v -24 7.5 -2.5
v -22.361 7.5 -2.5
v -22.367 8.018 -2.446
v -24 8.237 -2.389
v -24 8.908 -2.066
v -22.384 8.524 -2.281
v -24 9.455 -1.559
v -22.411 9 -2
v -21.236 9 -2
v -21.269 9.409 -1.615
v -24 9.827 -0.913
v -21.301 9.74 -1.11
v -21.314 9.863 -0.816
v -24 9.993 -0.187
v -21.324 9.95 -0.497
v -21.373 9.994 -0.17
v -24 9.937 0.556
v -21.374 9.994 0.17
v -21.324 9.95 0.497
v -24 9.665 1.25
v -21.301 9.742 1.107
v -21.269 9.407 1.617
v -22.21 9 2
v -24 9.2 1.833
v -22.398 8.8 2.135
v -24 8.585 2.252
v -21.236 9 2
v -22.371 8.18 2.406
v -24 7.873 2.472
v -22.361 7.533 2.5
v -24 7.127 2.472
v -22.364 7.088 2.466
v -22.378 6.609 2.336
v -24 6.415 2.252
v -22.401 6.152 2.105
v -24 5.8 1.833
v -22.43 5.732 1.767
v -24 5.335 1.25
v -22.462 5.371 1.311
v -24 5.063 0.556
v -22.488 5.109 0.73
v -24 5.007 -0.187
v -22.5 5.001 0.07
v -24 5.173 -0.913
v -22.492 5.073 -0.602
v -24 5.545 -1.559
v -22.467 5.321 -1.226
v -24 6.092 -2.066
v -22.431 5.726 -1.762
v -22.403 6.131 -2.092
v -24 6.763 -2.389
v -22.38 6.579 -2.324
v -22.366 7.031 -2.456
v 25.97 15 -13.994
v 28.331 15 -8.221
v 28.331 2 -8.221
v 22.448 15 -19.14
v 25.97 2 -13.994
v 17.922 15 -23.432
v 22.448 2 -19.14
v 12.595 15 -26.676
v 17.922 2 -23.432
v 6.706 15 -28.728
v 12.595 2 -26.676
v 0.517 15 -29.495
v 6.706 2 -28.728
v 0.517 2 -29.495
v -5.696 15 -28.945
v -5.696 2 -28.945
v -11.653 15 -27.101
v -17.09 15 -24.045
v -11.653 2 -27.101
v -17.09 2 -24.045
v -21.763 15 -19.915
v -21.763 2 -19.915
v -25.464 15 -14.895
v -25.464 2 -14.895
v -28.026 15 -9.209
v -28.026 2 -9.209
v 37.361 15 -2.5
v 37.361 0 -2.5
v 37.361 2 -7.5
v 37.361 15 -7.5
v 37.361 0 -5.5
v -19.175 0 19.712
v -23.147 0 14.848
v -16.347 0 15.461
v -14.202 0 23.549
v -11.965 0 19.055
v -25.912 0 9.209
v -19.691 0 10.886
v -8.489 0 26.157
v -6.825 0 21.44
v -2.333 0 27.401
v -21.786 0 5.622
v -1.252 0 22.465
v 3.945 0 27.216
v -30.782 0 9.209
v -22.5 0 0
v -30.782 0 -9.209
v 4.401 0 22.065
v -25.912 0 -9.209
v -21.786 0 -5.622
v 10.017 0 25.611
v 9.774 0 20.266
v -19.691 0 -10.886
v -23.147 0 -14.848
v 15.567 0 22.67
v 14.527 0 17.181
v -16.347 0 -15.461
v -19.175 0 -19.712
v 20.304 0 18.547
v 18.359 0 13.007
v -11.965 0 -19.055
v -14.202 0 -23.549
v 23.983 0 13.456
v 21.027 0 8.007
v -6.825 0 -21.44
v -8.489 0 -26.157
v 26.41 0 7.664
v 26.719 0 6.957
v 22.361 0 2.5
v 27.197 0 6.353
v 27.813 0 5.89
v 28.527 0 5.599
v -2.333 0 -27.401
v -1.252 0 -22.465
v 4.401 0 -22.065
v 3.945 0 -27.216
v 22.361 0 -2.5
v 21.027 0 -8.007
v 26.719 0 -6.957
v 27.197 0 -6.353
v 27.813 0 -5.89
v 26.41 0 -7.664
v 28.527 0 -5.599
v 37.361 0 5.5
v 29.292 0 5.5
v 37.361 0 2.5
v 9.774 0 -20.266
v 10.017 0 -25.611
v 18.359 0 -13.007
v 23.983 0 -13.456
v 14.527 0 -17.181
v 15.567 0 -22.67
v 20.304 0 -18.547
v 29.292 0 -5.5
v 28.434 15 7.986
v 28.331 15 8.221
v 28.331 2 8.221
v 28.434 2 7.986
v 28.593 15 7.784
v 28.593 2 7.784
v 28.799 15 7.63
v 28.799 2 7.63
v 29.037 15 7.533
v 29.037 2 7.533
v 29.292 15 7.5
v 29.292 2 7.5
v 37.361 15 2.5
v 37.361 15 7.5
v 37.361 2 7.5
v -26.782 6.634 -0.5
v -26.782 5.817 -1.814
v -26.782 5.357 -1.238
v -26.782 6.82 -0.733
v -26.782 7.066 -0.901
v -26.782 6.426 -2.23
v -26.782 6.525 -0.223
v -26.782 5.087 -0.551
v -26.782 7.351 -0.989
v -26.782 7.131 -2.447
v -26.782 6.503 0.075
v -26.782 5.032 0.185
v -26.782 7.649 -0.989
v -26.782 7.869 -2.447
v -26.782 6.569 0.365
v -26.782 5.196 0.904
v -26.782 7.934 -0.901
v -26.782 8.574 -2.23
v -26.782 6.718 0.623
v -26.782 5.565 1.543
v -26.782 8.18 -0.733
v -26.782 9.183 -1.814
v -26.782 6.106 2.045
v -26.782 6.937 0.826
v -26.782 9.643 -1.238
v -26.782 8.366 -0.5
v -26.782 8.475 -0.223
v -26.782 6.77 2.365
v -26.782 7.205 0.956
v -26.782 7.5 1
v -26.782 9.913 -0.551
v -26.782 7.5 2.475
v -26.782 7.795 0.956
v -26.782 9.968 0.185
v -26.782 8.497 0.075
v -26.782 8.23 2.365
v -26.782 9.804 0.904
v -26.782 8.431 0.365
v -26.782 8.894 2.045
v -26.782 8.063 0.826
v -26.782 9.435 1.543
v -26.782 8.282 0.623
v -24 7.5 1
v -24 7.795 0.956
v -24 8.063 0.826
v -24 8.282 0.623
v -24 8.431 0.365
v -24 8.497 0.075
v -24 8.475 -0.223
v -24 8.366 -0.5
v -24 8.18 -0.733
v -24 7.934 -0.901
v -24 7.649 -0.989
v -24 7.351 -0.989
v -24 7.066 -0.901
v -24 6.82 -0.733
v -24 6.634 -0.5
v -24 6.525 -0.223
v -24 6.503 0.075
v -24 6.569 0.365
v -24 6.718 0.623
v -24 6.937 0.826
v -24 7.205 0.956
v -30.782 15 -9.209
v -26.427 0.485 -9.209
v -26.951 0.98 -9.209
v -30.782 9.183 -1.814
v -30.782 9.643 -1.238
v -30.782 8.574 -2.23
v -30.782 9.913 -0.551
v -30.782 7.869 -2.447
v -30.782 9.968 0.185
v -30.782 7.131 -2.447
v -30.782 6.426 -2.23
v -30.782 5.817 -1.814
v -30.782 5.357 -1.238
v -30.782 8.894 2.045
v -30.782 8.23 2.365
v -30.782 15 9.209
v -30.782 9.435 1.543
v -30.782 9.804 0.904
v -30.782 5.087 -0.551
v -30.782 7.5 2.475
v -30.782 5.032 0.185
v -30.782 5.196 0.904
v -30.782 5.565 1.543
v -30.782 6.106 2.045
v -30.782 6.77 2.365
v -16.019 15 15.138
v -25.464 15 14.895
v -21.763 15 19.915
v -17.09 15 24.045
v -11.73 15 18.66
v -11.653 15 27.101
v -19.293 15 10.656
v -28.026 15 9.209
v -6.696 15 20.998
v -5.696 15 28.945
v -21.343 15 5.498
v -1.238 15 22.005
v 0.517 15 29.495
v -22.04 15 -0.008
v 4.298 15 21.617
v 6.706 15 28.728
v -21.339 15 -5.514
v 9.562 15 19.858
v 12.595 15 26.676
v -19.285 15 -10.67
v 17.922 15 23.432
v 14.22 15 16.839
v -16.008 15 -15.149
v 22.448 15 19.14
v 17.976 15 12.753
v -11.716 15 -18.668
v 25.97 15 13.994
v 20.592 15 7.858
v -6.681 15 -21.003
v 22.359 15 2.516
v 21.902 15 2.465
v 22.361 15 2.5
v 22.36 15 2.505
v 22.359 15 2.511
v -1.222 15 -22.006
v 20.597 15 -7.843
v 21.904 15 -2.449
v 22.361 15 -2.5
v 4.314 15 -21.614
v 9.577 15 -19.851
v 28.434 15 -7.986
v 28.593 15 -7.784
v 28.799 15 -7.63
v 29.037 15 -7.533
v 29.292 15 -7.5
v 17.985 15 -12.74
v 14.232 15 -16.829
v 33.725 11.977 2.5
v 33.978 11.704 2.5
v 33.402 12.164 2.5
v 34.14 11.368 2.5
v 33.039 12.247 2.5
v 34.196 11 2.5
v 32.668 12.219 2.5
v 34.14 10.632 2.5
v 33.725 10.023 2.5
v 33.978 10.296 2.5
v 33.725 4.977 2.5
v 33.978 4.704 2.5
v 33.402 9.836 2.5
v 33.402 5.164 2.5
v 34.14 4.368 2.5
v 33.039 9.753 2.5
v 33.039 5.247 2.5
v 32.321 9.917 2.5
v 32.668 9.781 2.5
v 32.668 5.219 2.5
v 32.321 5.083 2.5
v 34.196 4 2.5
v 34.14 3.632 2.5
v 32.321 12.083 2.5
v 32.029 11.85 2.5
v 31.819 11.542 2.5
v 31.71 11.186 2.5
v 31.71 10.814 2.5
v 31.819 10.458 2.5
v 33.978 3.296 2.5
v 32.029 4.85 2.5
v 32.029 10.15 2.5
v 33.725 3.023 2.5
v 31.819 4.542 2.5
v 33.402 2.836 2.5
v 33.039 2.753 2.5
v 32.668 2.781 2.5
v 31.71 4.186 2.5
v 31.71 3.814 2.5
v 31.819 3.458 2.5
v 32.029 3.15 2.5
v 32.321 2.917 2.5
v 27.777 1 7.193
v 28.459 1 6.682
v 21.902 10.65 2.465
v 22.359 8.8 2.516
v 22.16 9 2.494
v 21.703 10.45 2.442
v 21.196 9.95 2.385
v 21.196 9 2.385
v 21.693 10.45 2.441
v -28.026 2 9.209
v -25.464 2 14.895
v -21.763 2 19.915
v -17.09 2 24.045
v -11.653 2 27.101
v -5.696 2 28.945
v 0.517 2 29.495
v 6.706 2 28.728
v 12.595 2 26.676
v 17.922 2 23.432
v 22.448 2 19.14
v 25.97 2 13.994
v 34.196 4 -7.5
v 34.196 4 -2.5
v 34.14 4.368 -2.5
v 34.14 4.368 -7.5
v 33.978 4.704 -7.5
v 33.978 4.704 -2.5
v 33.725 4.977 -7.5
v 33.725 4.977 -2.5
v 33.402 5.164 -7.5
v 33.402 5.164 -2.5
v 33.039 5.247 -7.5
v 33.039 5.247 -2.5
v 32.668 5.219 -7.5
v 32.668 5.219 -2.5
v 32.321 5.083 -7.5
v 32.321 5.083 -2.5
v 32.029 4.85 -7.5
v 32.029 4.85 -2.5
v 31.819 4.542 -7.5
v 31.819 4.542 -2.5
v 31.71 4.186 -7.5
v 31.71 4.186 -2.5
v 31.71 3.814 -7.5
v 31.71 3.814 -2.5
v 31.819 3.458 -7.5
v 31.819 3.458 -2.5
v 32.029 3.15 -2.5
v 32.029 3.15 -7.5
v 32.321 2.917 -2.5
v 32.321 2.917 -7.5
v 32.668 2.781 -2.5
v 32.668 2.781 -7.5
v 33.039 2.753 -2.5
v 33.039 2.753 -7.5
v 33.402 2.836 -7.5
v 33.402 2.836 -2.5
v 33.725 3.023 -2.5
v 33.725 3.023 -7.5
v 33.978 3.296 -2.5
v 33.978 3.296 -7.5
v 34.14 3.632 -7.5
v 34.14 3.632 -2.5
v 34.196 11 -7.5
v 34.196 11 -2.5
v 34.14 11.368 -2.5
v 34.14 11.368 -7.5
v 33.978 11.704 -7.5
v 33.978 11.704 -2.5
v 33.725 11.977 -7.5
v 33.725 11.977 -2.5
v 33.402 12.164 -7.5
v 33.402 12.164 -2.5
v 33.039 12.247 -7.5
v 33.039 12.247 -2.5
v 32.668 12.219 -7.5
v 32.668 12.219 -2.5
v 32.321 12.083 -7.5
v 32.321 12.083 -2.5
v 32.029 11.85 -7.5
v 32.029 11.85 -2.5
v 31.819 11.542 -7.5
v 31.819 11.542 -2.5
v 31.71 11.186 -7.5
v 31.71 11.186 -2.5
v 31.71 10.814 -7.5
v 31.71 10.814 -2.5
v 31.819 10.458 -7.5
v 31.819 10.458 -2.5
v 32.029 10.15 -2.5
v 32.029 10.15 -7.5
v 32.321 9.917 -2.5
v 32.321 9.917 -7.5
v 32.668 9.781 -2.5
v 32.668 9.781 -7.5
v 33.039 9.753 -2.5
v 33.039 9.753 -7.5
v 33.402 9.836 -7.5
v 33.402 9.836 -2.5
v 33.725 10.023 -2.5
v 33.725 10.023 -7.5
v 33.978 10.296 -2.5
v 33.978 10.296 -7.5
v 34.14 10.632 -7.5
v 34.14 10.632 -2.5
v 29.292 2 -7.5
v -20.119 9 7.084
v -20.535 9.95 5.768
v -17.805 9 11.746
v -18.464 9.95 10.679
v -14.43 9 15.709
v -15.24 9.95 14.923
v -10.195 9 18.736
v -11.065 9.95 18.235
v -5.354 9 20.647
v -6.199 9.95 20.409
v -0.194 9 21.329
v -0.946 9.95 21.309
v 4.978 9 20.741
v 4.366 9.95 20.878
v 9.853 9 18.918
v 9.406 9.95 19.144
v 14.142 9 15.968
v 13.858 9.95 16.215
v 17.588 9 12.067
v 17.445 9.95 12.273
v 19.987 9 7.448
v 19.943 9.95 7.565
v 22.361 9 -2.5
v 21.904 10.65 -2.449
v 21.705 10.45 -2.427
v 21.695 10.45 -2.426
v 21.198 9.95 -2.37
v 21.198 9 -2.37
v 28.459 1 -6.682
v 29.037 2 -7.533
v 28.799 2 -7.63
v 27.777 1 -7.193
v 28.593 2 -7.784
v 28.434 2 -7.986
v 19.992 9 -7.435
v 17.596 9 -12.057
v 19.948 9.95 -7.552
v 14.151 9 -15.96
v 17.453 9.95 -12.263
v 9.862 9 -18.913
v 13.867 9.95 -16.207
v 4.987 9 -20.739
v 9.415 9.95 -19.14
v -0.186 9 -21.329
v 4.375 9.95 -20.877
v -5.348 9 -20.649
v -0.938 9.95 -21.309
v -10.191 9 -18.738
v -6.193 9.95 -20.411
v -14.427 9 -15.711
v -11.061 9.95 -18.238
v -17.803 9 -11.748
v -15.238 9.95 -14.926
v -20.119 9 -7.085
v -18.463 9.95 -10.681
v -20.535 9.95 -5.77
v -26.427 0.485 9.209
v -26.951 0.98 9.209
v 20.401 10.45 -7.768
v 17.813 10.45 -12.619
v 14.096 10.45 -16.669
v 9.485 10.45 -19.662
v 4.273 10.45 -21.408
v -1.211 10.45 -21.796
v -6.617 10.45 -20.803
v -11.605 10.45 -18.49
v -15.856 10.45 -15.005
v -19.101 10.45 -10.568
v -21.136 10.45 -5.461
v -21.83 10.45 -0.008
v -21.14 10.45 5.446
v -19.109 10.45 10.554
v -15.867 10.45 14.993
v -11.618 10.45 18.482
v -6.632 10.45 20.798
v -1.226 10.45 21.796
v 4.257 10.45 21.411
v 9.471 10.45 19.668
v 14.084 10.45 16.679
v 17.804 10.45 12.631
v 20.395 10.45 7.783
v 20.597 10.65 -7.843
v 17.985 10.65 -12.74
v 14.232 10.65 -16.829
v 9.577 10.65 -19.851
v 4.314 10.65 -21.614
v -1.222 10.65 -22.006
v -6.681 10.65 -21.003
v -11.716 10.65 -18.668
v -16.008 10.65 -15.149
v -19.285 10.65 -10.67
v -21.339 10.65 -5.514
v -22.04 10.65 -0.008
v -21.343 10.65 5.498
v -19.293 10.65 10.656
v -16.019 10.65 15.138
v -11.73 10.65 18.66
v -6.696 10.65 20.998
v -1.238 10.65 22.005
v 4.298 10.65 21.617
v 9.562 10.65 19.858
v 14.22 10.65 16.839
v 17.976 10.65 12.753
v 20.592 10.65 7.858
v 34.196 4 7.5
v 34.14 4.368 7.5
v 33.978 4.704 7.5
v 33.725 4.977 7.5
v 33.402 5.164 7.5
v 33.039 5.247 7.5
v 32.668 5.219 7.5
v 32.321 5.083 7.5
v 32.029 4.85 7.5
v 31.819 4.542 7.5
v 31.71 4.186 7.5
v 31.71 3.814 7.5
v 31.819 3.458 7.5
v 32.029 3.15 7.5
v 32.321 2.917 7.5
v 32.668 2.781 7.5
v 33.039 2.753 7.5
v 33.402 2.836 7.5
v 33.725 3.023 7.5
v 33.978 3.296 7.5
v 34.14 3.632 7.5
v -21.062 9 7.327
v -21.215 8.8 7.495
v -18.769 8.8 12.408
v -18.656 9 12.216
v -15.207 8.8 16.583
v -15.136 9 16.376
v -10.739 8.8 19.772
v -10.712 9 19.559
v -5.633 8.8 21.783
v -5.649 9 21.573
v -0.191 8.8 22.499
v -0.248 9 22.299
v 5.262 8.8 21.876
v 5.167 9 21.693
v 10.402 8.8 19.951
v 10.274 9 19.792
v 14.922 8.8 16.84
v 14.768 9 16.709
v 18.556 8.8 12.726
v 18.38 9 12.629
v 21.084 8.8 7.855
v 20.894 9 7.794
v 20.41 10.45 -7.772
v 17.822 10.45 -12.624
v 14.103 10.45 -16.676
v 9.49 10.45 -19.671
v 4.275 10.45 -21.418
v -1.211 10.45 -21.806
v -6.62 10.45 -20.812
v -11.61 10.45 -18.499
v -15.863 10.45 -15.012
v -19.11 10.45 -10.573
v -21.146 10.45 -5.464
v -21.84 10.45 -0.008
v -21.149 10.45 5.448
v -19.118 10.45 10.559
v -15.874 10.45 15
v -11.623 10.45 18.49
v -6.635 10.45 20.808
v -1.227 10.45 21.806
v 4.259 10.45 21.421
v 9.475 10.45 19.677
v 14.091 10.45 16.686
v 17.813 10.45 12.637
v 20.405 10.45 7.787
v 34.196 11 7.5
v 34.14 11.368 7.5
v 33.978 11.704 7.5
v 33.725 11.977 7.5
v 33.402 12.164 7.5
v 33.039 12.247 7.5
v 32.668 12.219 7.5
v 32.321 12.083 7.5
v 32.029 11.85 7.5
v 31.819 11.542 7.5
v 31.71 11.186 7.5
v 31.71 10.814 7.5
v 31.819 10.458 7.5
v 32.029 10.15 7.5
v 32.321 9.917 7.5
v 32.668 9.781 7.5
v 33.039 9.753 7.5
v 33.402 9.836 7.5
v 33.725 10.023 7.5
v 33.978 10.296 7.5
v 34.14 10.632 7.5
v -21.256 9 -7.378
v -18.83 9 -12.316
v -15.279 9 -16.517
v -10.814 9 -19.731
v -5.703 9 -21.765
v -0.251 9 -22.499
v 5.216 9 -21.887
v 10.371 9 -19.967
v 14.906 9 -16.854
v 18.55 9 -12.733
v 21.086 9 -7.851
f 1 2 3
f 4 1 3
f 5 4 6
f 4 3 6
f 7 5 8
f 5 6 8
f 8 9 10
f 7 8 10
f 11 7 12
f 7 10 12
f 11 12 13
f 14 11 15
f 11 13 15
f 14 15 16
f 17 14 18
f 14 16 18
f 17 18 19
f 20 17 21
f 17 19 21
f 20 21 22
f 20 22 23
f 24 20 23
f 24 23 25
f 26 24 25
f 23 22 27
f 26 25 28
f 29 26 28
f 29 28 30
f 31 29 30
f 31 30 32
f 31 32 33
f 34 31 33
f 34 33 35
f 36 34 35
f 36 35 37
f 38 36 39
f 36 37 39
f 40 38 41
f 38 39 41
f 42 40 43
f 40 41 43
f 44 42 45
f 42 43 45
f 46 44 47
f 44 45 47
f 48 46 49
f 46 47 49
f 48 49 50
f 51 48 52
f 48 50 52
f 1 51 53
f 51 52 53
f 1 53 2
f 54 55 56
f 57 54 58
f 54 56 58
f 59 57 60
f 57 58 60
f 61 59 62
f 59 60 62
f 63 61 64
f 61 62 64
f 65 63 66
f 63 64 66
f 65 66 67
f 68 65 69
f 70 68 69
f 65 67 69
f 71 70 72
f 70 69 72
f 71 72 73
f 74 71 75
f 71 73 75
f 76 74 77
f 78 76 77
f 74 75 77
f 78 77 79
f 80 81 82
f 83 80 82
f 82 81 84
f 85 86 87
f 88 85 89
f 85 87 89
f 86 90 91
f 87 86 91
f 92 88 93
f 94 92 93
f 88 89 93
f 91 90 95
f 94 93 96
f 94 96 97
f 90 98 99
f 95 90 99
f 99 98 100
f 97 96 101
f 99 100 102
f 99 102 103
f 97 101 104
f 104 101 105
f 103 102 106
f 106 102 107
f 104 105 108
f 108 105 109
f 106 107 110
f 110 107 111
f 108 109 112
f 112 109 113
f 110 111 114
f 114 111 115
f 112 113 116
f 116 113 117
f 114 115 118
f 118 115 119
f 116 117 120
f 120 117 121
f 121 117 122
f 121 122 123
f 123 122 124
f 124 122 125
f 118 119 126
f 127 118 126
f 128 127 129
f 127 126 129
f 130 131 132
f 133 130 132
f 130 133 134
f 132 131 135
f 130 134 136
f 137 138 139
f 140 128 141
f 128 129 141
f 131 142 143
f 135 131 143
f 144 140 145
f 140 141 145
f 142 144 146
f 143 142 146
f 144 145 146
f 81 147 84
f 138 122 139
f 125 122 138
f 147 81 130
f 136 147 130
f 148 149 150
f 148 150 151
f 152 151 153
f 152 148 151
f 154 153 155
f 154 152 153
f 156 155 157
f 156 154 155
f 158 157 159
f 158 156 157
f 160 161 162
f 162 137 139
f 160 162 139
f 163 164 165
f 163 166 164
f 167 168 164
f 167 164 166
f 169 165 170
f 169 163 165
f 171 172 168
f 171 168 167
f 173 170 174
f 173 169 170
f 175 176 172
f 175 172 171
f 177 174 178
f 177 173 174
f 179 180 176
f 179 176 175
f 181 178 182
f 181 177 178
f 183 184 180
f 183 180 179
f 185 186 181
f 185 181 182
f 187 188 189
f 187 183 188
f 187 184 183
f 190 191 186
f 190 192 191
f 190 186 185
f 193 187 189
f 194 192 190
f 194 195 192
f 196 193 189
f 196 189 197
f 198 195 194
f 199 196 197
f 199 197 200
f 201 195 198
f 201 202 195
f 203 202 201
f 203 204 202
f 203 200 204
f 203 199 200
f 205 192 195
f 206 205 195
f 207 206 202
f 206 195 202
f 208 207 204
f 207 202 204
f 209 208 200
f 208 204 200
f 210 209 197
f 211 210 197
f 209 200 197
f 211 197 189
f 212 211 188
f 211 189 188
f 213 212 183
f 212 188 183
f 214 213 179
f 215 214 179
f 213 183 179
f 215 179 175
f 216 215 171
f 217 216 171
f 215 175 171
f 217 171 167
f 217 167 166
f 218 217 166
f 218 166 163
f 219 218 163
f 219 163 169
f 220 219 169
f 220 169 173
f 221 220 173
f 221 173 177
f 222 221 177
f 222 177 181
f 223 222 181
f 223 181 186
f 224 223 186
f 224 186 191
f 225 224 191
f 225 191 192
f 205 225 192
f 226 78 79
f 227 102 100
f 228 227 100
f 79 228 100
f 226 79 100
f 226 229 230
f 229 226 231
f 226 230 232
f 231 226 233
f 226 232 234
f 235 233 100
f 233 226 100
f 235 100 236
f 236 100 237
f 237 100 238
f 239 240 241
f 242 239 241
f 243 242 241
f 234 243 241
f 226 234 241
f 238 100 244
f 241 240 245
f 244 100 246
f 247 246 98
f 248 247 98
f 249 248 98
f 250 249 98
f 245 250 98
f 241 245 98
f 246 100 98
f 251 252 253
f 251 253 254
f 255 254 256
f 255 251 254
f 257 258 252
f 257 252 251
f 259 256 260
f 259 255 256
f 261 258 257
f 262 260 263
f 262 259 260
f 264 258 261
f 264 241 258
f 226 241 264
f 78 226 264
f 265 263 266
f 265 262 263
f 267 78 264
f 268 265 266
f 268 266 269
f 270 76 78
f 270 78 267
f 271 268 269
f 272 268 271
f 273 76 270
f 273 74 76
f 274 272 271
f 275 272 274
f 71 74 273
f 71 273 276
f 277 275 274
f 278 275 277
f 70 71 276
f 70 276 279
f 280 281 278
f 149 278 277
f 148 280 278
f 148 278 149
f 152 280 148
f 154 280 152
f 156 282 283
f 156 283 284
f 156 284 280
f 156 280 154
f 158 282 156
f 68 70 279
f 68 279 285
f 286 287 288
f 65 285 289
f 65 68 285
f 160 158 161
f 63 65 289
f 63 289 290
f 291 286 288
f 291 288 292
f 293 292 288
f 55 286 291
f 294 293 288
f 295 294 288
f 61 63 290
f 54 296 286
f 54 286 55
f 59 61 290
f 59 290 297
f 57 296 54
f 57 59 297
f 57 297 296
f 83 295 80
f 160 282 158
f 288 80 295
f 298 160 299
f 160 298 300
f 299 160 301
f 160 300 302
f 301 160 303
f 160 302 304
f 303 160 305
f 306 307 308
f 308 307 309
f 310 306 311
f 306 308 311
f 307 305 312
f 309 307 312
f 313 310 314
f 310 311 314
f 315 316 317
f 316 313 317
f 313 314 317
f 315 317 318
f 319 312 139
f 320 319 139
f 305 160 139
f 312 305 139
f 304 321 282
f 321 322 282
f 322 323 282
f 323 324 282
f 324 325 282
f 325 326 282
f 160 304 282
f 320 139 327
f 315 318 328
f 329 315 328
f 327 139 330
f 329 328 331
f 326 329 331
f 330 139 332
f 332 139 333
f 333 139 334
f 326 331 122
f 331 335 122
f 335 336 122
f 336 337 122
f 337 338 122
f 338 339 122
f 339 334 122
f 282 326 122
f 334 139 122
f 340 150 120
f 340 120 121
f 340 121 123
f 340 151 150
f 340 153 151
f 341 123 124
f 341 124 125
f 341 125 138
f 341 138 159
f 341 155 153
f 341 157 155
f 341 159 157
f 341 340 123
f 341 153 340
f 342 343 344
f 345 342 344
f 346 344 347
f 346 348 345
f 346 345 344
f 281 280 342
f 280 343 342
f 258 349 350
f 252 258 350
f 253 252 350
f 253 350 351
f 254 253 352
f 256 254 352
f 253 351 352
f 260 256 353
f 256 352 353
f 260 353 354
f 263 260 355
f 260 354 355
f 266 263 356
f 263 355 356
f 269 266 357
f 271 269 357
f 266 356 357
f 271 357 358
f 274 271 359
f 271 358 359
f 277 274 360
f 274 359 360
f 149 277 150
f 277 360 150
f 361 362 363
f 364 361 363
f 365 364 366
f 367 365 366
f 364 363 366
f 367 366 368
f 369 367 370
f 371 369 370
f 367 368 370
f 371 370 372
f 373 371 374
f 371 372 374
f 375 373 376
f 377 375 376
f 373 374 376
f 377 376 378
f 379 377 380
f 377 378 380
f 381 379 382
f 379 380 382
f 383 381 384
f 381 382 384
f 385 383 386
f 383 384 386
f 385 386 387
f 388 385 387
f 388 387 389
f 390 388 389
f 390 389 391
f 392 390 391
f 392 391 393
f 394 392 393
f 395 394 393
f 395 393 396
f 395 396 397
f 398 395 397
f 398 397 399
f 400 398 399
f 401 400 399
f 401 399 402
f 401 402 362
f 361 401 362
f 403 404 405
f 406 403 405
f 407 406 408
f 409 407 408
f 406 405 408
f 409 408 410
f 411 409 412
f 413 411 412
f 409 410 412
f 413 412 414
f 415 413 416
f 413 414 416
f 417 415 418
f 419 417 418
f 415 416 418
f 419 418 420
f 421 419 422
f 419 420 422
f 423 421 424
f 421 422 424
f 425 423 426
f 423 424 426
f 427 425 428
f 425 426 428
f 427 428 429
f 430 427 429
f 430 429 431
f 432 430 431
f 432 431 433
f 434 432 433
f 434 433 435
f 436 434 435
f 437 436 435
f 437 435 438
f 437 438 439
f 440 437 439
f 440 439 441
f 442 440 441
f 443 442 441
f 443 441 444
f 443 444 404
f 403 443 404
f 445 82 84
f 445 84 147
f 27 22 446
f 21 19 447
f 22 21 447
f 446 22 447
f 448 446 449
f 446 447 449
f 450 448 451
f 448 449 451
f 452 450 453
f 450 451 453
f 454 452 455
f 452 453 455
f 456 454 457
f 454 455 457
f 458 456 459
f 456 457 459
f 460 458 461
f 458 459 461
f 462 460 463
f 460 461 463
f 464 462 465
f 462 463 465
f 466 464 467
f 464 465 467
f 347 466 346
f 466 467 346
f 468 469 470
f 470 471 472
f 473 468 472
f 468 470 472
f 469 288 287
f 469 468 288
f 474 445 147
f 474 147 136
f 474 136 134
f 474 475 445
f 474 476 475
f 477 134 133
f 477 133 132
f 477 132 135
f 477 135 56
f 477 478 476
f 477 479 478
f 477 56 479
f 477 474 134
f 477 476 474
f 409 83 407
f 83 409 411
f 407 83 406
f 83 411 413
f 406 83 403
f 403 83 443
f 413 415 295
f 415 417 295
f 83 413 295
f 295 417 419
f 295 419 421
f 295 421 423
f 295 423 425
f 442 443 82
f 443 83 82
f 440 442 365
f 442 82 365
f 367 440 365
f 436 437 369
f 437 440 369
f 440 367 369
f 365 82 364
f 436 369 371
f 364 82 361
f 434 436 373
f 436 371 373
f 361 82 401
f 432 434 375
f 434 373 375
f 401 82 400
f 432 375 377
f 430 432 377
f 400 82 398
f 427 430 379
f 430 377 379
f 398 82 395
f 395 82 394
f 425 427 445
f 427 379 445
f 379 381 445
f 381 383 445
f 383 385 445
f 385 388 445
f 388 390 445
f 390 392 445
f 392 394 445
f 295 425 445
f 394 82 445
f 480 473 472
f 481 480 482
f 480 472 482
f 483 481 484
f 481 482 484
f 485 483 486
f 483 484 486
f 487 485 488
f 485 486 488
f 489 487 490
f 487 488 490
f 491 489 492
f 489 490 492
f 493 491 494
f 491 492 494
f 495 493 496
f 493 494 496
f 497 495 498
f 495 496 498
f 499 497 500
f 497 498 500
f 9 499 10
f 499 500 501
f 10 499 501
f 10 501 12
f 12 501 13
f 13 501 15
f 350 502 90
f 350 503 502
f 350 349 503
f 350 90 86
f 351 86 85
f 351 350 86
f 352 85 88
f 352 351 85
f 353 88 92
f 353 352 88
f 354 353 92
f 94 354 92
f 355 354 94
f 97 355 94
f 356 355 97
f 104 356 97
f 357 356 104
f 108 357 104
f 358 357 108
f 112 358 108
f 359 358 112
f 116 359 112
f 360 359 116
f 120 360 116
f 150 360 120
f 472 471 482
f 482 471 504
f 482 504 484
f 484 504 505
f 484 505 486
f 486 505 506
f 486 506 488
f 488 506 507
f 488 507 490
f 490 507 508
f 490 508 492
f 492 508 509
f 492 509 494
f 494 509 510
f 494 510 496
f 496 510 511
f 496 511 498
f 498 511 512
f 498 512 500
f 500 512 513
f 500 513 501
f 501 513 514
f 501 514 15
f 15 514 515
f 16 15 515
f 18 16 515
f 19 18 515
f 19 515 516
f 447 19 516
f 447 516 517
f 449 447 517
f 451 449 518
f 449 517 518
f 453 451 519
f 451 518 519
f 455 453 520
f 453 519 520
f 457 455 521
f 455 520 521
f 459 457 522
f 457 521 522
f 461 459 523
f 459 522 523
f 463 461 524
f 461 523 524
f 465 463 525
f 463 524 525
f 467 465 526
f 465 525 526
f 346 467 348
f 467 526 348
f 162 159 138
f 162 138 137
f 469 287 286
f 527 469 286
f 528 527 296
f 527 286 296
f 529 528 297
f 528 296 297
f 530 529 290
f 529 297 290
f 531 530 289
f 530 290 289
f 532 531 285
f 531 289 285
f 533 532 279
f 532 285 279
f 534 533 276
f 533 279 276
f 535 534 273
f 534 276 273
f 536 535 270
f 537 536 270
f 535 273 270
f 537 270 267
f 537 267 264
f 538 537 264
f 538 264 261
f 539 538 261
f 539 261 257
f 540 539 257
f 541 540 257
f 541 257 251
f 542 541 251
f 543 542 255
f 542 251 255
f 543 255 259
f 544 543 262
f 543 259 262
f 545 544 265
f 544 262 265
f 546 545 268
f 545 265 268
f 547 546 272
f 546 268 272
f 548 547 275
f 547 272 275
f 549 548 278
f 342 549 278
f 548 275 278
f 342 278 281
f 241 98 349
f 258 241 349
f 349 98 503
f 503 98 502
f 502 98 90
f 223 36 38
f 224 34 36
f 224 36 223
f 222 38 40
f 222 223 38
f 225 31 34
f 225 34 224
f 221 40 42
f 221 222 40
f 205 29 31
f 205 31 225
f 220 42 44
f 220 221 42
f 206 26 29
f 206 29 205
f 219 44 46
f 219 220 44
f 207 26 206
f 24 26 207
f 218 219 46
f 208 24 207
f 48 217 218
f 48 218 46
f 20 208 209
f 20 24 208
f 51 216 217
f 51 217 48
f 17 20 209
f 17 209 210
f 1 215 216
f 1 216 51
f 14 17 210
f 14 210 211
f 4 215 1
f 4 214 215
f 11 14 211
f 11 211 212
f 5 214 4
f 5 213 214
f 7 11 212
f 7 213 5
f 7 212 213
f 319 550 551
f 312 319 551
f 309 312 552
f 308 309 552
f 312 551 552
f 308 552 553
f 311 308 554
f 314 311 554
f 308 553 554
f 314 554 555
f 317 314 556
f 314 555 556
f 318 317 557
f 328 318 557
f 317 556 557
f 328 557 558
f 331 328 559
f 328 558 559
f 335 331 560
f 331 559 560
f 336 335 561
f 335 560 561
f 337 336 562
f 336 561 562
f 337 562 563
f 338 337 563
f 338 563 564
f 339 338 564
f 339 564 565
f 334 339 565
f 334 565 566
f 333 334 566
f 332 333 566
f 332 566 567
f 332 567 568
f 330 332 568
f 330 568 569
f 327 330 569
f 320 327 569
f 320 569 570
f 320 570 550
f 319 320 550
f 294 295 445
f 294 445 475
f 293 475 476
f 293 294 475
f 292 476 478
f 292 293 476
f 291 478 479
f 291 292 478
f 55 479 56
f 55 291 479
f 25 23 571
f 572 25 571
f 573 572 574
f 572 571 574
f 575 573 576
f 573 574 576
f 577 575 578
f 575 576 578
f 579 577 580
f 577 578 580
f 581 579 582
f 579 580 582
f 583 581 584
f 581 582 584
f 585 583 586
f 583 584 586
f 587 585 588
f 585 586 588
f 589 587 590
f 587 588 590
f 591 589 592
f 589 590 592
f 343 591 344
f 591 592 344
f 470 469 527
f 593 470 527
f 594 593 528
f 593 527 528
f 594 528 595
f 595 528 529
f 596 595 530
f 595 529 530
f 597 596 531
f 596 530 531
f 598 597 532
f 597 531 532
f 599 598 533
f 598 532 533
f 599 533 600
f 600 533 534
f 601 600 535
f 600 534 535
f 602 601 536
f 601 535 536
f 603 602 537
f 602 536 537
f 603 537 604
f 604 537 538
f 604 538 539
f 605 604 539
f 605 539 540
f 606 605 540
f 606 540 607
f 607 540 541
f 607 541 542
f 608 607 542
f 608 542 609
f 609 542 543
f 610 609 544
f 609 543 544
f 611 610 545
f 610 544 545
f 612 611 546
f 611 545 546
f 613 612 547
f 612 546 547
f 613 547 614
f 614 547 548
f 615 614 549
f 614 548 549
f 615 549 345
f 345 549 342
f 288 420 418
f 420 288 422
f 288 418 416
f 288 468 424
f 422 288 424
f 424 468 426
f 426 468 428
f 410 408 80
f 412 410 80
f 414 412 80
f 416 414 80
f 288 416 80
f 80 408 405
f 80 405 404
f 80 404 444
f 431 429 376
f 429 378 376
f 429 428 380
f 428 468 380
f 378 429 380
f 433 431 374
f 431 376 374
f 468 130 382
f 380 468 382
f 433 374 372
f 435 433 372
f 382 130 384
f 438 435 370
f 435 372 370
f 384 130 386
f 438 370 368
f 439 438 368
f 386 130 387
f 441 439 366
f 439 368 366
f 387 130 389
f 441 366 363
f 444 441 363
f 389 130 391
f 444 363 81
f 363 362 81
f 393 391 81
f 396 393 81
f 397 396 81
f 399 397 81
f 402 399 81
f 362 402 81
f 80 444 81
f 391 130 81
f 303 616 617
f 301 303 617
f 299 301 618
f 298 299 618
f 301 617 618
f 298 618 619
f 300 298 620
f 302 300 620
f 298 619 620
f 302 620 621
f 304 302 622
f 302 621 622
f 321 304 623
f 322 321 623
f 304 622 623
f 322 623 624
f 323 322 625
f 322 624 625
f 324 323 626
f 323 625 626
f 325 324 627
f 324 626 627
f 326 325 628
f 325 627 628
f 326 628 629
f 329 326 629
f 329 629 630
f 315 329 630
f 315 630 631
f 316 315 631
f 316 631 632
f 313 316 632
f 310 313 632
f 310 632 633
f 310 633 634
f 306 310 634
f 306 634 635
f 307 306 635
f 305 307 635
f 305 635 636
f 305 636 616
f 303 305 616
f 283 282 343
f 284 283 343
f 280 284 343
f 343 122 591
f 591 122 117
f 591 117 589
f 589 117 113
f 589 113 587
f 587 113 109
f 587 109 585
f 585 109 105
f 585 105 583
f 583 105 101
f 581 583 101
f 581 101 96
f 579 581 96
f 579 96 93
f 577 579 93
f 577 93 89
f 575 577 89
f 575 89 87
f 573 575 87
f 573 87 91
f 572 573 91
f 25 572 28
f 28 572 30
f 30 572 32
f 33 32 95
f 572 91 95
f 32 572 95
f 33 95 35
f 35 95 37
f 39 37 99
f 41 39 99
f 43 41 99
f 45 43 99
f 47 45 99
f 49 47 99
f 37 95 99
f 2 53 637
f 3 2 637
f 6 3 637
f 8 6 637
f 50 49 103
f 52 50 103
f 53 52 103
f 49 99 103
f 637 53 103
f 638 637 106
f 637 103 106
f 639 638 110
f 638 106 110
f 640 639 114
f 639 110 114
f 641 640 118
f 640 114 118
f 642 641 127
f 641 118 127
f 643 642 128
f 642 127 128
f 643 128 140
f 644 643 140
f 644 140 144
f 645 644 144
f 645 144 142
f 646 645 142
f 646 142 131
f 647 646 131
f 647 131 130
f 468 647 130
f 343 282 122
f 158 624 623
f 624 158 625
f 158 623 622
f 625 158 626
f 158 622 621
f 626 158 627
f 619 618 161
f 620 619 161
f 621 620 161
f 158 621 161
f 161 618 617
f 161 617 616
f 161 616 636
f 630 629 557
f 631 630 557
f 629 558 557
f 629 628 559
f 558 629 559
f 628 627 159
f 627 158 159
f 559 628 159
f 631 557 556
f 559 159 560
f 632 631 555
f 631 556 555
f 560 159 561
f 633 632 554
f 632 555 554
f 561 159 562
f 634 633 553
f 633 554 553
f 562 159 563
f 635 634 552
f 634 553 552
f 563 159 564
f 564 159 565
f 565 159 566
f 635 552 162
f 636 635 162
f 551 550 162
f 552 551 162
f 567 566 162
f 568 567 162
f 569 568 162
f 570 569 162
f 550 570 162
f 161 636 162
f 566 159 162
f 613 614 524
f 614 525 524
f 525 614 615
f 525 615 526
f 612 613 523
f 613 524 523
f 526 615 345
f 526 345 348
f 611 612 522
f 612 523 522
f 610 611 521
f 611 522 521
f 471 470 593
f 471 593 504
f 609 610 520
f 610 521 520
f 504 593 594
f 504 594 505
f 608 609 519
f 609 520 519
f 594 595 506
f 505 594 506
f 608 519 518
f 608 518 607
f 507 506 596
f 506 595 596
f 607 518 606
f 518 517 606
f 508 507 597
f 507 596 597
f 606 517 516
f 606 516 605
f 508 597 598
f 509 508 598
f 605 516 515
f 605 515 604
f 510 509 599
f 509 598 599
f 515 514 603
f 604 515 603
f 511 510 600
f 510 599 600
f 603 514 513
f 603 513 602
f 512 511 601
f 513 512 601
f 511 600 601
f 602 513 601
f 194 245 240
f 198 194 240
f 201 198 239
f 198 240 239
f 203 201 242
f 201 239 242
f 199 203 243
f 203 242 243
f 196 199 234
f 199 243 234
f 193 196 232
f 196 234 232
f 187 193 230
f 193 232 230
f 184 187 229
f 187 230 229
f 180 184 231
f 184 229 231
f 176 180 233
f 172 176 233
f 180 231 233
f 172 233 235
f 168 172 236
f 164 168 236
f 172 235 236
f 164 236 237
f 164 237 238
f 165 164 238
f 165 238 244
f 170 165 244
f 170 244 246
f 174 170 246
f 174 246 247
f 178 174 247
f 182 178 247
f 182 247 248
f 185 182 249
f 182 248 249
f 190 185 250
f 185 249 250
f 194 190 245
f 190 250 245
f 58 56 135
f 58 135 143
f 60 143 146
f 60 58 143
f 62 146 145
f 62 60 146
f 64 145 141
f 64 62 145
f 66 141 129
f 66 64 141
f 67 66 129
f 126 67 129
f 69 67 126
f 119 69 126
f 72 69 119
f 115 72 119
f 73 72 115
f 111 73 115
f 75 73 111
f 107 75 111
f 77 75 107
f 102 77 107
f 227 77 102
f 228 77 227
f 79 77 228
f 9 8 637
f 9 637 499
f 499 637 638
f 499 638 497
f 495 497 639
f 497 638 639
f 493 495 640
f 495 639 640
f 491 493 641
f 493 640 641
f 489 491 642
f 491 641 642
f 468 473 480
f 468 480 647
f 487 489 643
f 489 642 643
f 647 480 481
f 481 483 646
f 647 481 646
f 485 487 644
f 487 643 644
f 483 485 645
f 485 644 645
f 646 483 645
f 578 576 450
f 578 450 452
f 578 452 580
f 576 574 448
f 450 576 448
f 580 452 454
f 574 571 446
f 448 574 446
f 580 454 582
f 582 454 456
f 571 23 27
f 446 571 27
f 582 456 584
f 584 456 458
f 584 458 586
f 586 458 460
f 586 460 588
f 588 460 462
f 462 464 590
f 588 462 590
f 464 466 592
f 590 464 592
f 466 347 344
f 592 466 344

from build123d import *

# Parameters (mm, degrees)
BOSS_EXTRUDE1_DEPTH = 15
REVOLVE2_ANGLE      = 347.2
SKETCH9_R           = 1.25
CUT_EXTRUDE1_DEPTH  = 20
SKETCH10_R          = 2.475
CUT_EXTRUDE3_DEPTH  = 4
SKETCH12_R          = 1
CUT_EXTRUDE4_DEPTH  = 5
SKETCH13_R          = 2.5
CUT_EXTRUDE6_DEPTH  = 24
CHAMFER1_SIZE       = 0.2
FILLET1_R           = 1
CHAMFER2_SIZE       = 0.5
CHAMFER3_SIZE       = 2


with BuildPart() as part:
    # Sketch3 → Boss-Extrude1 (new body)
    with BuildSketch(Plane(origin=(0, 0, 0), x_dir=(1, 0, 0), z_dir=(0, 1, 0))):
        with BuildLine():
            Line((22.360679775, 2.5), (37.360679775, 2.5))
            Line((37.360679775, 2.5), (37.360679775, 7.5))
            Line((37.360679775, 7.5), (28.530685235, 7.5))
            ThreePointArc((28.530685235, 7.5), (0.890802954, 29.486547273), (-28.025910222, 9.208602294))
            Line((-28.025910222, 9.208602294), (-30.781929629, 9.208602294))
            Line((-30.781929629, 9.208602294), (-30.781929629, -9.208602294))
            Line((-30.781929629, -9.208602294), (-28.025910222, -9.208602294))
            ThreePointArc((-28.025910222, -9.208602294), (0.890802954, -29.486547273), (28.530685235, -7.5))
            Line((28.530685235, -7.5), (37.360679775, -7.5))
            Line((37.360679775, -7.5), (37.360679775, -2.5))
            Line((37.360679775, -2.5), (22.360679775, -2.5))
            ThreePointArc((22.360679775, -2.5), (-22.5, 0), (22.360679775, 2.5))
        make_face()
    extrude(amount=BOSS_EXTRUDE1_DEPTH)

    # Sketch8 → Revolve2 (revolve)
    with BuildSketch(Plane(origin=(0, 0, 0), x_dir=(-0.9938079899999066, 0, 0.11111111111111108), z_dir=(-0.11111111111111106, 0, -0.9938079899999065))):
        Polygon((-22.5, 9), (-21.33, 9), (-21.33, 10.45), (-22.04, 10.45), (-22.04, 15), (-22.5, 15), align=None)
    revolve(axis=Axis((0, 0, 0), (0, 1, 0)), revolution_arc=REVOLVE2_ANGLE)

    # Sketch9 → Cut-Extrude1 (cut)
    with BuildSketch(Plane.XY.offset(7.5)):
        with Locations((32.945682505, 11)):
            Circle(SKETCH9_R)
        with Locations((32.945682505, 4)):
            Circle(SKETCH9_R)
    extrude(amount=-CUT_EXTRUDE1_DEPTH, mode=Mode.SUBTRACT)

    # Sketch10 → Cut-Extrude3 (cut)
    with BuildSketch(Plane.ZY.offset(30.781929629)):
        with Locations((0, 7.5)):
            Circle(SKETCH10_R)
    extrude(amount=-CUT_EXTRUDE3_DEPTH, mode=Mode.SUBTRACT)

    # Sketch12 → Cut-Extrude4 (cut)
    with BuildSketch(Plane.ZY.offset(26.781929629)):
        with Locations((0, 7.5)):
            Circle(SKETCH12_R)
    extrude(amount=-CUT_EXTRUDE4_DEPTH, mode=Mode.SUBTRACT)

    # Sketch13 → Cut-Extrude6 (cut)
    with BuildSketch(Plane(origin=(0, 0, 0), x_dir=(0, 0, -1), z_dir=(1, 0, 0))):
        with Locations((0, 7.5)):
            Circle(SKETCH13_R)
    extrude(amount=-CUT_EXTRUDE6_DEPTH, mode=Mode.SUBTRACT)

    # Chamfer1
    chamfer1_edges = [part.edges().sort_by_distance(p)[0] for p in [
        (-0.259360391, 9, 22.49850511),
        (-22.039998571, 10.45, -0.007935673),
    ]]
    chamfer(chamfer1_edges, length=CHAMFER1_SIZE)

    # Fillet1
    fillet1_edges = [part.edges().sort_by_distance(p)[0] for p in [
        (28.530685235, 7.5, 7.5),
        (28.530685235, 7.5, -7.5),
    ]]
    fillet(fillet1_edges, radius=FILLET1_R)

    # Chamfer2
    # the kernel refuses this chamfer: 0.5 mm, written as the material it takes off along each edge
    with BuildSketch(Plane(origin=(0, 10.45, 0), x_dir=(0.9987152347198149, 0, -0.05067425321151771), z_dir=(0.05067425321151771, 0, 0.9987152347198149))) as chamfer2_piece_1:
        Polygon((21.33, -CHAMFER2_SIZE), (21.33 + CHAMFER2_SIZE, 0), (21.33, 0), align=None)
    revolve(axis=Axis((0, 10.45, 0), (0, 1, 0)), revolution_arc=354.149410651, mode=Mode.SUBTRACT)

    # Chamfer3
    chamfer3_edges = [part.edges().sort_by_distance(p)[0] for p in [
        (0.516715321, 0, -29.495474319),
        (33.326158403, 0, 7.5),
        (28.691090832, 0, -7.700409941),
        (28.691090832, 0, 7.700409941),
        (0.516715321, 0, 29.495474319),
        (33.326158403, 0, -7.5),
    ]]
    chamfer(chamfer3_edges, length=CHAMFER3_SIZE)


solid = part.part
